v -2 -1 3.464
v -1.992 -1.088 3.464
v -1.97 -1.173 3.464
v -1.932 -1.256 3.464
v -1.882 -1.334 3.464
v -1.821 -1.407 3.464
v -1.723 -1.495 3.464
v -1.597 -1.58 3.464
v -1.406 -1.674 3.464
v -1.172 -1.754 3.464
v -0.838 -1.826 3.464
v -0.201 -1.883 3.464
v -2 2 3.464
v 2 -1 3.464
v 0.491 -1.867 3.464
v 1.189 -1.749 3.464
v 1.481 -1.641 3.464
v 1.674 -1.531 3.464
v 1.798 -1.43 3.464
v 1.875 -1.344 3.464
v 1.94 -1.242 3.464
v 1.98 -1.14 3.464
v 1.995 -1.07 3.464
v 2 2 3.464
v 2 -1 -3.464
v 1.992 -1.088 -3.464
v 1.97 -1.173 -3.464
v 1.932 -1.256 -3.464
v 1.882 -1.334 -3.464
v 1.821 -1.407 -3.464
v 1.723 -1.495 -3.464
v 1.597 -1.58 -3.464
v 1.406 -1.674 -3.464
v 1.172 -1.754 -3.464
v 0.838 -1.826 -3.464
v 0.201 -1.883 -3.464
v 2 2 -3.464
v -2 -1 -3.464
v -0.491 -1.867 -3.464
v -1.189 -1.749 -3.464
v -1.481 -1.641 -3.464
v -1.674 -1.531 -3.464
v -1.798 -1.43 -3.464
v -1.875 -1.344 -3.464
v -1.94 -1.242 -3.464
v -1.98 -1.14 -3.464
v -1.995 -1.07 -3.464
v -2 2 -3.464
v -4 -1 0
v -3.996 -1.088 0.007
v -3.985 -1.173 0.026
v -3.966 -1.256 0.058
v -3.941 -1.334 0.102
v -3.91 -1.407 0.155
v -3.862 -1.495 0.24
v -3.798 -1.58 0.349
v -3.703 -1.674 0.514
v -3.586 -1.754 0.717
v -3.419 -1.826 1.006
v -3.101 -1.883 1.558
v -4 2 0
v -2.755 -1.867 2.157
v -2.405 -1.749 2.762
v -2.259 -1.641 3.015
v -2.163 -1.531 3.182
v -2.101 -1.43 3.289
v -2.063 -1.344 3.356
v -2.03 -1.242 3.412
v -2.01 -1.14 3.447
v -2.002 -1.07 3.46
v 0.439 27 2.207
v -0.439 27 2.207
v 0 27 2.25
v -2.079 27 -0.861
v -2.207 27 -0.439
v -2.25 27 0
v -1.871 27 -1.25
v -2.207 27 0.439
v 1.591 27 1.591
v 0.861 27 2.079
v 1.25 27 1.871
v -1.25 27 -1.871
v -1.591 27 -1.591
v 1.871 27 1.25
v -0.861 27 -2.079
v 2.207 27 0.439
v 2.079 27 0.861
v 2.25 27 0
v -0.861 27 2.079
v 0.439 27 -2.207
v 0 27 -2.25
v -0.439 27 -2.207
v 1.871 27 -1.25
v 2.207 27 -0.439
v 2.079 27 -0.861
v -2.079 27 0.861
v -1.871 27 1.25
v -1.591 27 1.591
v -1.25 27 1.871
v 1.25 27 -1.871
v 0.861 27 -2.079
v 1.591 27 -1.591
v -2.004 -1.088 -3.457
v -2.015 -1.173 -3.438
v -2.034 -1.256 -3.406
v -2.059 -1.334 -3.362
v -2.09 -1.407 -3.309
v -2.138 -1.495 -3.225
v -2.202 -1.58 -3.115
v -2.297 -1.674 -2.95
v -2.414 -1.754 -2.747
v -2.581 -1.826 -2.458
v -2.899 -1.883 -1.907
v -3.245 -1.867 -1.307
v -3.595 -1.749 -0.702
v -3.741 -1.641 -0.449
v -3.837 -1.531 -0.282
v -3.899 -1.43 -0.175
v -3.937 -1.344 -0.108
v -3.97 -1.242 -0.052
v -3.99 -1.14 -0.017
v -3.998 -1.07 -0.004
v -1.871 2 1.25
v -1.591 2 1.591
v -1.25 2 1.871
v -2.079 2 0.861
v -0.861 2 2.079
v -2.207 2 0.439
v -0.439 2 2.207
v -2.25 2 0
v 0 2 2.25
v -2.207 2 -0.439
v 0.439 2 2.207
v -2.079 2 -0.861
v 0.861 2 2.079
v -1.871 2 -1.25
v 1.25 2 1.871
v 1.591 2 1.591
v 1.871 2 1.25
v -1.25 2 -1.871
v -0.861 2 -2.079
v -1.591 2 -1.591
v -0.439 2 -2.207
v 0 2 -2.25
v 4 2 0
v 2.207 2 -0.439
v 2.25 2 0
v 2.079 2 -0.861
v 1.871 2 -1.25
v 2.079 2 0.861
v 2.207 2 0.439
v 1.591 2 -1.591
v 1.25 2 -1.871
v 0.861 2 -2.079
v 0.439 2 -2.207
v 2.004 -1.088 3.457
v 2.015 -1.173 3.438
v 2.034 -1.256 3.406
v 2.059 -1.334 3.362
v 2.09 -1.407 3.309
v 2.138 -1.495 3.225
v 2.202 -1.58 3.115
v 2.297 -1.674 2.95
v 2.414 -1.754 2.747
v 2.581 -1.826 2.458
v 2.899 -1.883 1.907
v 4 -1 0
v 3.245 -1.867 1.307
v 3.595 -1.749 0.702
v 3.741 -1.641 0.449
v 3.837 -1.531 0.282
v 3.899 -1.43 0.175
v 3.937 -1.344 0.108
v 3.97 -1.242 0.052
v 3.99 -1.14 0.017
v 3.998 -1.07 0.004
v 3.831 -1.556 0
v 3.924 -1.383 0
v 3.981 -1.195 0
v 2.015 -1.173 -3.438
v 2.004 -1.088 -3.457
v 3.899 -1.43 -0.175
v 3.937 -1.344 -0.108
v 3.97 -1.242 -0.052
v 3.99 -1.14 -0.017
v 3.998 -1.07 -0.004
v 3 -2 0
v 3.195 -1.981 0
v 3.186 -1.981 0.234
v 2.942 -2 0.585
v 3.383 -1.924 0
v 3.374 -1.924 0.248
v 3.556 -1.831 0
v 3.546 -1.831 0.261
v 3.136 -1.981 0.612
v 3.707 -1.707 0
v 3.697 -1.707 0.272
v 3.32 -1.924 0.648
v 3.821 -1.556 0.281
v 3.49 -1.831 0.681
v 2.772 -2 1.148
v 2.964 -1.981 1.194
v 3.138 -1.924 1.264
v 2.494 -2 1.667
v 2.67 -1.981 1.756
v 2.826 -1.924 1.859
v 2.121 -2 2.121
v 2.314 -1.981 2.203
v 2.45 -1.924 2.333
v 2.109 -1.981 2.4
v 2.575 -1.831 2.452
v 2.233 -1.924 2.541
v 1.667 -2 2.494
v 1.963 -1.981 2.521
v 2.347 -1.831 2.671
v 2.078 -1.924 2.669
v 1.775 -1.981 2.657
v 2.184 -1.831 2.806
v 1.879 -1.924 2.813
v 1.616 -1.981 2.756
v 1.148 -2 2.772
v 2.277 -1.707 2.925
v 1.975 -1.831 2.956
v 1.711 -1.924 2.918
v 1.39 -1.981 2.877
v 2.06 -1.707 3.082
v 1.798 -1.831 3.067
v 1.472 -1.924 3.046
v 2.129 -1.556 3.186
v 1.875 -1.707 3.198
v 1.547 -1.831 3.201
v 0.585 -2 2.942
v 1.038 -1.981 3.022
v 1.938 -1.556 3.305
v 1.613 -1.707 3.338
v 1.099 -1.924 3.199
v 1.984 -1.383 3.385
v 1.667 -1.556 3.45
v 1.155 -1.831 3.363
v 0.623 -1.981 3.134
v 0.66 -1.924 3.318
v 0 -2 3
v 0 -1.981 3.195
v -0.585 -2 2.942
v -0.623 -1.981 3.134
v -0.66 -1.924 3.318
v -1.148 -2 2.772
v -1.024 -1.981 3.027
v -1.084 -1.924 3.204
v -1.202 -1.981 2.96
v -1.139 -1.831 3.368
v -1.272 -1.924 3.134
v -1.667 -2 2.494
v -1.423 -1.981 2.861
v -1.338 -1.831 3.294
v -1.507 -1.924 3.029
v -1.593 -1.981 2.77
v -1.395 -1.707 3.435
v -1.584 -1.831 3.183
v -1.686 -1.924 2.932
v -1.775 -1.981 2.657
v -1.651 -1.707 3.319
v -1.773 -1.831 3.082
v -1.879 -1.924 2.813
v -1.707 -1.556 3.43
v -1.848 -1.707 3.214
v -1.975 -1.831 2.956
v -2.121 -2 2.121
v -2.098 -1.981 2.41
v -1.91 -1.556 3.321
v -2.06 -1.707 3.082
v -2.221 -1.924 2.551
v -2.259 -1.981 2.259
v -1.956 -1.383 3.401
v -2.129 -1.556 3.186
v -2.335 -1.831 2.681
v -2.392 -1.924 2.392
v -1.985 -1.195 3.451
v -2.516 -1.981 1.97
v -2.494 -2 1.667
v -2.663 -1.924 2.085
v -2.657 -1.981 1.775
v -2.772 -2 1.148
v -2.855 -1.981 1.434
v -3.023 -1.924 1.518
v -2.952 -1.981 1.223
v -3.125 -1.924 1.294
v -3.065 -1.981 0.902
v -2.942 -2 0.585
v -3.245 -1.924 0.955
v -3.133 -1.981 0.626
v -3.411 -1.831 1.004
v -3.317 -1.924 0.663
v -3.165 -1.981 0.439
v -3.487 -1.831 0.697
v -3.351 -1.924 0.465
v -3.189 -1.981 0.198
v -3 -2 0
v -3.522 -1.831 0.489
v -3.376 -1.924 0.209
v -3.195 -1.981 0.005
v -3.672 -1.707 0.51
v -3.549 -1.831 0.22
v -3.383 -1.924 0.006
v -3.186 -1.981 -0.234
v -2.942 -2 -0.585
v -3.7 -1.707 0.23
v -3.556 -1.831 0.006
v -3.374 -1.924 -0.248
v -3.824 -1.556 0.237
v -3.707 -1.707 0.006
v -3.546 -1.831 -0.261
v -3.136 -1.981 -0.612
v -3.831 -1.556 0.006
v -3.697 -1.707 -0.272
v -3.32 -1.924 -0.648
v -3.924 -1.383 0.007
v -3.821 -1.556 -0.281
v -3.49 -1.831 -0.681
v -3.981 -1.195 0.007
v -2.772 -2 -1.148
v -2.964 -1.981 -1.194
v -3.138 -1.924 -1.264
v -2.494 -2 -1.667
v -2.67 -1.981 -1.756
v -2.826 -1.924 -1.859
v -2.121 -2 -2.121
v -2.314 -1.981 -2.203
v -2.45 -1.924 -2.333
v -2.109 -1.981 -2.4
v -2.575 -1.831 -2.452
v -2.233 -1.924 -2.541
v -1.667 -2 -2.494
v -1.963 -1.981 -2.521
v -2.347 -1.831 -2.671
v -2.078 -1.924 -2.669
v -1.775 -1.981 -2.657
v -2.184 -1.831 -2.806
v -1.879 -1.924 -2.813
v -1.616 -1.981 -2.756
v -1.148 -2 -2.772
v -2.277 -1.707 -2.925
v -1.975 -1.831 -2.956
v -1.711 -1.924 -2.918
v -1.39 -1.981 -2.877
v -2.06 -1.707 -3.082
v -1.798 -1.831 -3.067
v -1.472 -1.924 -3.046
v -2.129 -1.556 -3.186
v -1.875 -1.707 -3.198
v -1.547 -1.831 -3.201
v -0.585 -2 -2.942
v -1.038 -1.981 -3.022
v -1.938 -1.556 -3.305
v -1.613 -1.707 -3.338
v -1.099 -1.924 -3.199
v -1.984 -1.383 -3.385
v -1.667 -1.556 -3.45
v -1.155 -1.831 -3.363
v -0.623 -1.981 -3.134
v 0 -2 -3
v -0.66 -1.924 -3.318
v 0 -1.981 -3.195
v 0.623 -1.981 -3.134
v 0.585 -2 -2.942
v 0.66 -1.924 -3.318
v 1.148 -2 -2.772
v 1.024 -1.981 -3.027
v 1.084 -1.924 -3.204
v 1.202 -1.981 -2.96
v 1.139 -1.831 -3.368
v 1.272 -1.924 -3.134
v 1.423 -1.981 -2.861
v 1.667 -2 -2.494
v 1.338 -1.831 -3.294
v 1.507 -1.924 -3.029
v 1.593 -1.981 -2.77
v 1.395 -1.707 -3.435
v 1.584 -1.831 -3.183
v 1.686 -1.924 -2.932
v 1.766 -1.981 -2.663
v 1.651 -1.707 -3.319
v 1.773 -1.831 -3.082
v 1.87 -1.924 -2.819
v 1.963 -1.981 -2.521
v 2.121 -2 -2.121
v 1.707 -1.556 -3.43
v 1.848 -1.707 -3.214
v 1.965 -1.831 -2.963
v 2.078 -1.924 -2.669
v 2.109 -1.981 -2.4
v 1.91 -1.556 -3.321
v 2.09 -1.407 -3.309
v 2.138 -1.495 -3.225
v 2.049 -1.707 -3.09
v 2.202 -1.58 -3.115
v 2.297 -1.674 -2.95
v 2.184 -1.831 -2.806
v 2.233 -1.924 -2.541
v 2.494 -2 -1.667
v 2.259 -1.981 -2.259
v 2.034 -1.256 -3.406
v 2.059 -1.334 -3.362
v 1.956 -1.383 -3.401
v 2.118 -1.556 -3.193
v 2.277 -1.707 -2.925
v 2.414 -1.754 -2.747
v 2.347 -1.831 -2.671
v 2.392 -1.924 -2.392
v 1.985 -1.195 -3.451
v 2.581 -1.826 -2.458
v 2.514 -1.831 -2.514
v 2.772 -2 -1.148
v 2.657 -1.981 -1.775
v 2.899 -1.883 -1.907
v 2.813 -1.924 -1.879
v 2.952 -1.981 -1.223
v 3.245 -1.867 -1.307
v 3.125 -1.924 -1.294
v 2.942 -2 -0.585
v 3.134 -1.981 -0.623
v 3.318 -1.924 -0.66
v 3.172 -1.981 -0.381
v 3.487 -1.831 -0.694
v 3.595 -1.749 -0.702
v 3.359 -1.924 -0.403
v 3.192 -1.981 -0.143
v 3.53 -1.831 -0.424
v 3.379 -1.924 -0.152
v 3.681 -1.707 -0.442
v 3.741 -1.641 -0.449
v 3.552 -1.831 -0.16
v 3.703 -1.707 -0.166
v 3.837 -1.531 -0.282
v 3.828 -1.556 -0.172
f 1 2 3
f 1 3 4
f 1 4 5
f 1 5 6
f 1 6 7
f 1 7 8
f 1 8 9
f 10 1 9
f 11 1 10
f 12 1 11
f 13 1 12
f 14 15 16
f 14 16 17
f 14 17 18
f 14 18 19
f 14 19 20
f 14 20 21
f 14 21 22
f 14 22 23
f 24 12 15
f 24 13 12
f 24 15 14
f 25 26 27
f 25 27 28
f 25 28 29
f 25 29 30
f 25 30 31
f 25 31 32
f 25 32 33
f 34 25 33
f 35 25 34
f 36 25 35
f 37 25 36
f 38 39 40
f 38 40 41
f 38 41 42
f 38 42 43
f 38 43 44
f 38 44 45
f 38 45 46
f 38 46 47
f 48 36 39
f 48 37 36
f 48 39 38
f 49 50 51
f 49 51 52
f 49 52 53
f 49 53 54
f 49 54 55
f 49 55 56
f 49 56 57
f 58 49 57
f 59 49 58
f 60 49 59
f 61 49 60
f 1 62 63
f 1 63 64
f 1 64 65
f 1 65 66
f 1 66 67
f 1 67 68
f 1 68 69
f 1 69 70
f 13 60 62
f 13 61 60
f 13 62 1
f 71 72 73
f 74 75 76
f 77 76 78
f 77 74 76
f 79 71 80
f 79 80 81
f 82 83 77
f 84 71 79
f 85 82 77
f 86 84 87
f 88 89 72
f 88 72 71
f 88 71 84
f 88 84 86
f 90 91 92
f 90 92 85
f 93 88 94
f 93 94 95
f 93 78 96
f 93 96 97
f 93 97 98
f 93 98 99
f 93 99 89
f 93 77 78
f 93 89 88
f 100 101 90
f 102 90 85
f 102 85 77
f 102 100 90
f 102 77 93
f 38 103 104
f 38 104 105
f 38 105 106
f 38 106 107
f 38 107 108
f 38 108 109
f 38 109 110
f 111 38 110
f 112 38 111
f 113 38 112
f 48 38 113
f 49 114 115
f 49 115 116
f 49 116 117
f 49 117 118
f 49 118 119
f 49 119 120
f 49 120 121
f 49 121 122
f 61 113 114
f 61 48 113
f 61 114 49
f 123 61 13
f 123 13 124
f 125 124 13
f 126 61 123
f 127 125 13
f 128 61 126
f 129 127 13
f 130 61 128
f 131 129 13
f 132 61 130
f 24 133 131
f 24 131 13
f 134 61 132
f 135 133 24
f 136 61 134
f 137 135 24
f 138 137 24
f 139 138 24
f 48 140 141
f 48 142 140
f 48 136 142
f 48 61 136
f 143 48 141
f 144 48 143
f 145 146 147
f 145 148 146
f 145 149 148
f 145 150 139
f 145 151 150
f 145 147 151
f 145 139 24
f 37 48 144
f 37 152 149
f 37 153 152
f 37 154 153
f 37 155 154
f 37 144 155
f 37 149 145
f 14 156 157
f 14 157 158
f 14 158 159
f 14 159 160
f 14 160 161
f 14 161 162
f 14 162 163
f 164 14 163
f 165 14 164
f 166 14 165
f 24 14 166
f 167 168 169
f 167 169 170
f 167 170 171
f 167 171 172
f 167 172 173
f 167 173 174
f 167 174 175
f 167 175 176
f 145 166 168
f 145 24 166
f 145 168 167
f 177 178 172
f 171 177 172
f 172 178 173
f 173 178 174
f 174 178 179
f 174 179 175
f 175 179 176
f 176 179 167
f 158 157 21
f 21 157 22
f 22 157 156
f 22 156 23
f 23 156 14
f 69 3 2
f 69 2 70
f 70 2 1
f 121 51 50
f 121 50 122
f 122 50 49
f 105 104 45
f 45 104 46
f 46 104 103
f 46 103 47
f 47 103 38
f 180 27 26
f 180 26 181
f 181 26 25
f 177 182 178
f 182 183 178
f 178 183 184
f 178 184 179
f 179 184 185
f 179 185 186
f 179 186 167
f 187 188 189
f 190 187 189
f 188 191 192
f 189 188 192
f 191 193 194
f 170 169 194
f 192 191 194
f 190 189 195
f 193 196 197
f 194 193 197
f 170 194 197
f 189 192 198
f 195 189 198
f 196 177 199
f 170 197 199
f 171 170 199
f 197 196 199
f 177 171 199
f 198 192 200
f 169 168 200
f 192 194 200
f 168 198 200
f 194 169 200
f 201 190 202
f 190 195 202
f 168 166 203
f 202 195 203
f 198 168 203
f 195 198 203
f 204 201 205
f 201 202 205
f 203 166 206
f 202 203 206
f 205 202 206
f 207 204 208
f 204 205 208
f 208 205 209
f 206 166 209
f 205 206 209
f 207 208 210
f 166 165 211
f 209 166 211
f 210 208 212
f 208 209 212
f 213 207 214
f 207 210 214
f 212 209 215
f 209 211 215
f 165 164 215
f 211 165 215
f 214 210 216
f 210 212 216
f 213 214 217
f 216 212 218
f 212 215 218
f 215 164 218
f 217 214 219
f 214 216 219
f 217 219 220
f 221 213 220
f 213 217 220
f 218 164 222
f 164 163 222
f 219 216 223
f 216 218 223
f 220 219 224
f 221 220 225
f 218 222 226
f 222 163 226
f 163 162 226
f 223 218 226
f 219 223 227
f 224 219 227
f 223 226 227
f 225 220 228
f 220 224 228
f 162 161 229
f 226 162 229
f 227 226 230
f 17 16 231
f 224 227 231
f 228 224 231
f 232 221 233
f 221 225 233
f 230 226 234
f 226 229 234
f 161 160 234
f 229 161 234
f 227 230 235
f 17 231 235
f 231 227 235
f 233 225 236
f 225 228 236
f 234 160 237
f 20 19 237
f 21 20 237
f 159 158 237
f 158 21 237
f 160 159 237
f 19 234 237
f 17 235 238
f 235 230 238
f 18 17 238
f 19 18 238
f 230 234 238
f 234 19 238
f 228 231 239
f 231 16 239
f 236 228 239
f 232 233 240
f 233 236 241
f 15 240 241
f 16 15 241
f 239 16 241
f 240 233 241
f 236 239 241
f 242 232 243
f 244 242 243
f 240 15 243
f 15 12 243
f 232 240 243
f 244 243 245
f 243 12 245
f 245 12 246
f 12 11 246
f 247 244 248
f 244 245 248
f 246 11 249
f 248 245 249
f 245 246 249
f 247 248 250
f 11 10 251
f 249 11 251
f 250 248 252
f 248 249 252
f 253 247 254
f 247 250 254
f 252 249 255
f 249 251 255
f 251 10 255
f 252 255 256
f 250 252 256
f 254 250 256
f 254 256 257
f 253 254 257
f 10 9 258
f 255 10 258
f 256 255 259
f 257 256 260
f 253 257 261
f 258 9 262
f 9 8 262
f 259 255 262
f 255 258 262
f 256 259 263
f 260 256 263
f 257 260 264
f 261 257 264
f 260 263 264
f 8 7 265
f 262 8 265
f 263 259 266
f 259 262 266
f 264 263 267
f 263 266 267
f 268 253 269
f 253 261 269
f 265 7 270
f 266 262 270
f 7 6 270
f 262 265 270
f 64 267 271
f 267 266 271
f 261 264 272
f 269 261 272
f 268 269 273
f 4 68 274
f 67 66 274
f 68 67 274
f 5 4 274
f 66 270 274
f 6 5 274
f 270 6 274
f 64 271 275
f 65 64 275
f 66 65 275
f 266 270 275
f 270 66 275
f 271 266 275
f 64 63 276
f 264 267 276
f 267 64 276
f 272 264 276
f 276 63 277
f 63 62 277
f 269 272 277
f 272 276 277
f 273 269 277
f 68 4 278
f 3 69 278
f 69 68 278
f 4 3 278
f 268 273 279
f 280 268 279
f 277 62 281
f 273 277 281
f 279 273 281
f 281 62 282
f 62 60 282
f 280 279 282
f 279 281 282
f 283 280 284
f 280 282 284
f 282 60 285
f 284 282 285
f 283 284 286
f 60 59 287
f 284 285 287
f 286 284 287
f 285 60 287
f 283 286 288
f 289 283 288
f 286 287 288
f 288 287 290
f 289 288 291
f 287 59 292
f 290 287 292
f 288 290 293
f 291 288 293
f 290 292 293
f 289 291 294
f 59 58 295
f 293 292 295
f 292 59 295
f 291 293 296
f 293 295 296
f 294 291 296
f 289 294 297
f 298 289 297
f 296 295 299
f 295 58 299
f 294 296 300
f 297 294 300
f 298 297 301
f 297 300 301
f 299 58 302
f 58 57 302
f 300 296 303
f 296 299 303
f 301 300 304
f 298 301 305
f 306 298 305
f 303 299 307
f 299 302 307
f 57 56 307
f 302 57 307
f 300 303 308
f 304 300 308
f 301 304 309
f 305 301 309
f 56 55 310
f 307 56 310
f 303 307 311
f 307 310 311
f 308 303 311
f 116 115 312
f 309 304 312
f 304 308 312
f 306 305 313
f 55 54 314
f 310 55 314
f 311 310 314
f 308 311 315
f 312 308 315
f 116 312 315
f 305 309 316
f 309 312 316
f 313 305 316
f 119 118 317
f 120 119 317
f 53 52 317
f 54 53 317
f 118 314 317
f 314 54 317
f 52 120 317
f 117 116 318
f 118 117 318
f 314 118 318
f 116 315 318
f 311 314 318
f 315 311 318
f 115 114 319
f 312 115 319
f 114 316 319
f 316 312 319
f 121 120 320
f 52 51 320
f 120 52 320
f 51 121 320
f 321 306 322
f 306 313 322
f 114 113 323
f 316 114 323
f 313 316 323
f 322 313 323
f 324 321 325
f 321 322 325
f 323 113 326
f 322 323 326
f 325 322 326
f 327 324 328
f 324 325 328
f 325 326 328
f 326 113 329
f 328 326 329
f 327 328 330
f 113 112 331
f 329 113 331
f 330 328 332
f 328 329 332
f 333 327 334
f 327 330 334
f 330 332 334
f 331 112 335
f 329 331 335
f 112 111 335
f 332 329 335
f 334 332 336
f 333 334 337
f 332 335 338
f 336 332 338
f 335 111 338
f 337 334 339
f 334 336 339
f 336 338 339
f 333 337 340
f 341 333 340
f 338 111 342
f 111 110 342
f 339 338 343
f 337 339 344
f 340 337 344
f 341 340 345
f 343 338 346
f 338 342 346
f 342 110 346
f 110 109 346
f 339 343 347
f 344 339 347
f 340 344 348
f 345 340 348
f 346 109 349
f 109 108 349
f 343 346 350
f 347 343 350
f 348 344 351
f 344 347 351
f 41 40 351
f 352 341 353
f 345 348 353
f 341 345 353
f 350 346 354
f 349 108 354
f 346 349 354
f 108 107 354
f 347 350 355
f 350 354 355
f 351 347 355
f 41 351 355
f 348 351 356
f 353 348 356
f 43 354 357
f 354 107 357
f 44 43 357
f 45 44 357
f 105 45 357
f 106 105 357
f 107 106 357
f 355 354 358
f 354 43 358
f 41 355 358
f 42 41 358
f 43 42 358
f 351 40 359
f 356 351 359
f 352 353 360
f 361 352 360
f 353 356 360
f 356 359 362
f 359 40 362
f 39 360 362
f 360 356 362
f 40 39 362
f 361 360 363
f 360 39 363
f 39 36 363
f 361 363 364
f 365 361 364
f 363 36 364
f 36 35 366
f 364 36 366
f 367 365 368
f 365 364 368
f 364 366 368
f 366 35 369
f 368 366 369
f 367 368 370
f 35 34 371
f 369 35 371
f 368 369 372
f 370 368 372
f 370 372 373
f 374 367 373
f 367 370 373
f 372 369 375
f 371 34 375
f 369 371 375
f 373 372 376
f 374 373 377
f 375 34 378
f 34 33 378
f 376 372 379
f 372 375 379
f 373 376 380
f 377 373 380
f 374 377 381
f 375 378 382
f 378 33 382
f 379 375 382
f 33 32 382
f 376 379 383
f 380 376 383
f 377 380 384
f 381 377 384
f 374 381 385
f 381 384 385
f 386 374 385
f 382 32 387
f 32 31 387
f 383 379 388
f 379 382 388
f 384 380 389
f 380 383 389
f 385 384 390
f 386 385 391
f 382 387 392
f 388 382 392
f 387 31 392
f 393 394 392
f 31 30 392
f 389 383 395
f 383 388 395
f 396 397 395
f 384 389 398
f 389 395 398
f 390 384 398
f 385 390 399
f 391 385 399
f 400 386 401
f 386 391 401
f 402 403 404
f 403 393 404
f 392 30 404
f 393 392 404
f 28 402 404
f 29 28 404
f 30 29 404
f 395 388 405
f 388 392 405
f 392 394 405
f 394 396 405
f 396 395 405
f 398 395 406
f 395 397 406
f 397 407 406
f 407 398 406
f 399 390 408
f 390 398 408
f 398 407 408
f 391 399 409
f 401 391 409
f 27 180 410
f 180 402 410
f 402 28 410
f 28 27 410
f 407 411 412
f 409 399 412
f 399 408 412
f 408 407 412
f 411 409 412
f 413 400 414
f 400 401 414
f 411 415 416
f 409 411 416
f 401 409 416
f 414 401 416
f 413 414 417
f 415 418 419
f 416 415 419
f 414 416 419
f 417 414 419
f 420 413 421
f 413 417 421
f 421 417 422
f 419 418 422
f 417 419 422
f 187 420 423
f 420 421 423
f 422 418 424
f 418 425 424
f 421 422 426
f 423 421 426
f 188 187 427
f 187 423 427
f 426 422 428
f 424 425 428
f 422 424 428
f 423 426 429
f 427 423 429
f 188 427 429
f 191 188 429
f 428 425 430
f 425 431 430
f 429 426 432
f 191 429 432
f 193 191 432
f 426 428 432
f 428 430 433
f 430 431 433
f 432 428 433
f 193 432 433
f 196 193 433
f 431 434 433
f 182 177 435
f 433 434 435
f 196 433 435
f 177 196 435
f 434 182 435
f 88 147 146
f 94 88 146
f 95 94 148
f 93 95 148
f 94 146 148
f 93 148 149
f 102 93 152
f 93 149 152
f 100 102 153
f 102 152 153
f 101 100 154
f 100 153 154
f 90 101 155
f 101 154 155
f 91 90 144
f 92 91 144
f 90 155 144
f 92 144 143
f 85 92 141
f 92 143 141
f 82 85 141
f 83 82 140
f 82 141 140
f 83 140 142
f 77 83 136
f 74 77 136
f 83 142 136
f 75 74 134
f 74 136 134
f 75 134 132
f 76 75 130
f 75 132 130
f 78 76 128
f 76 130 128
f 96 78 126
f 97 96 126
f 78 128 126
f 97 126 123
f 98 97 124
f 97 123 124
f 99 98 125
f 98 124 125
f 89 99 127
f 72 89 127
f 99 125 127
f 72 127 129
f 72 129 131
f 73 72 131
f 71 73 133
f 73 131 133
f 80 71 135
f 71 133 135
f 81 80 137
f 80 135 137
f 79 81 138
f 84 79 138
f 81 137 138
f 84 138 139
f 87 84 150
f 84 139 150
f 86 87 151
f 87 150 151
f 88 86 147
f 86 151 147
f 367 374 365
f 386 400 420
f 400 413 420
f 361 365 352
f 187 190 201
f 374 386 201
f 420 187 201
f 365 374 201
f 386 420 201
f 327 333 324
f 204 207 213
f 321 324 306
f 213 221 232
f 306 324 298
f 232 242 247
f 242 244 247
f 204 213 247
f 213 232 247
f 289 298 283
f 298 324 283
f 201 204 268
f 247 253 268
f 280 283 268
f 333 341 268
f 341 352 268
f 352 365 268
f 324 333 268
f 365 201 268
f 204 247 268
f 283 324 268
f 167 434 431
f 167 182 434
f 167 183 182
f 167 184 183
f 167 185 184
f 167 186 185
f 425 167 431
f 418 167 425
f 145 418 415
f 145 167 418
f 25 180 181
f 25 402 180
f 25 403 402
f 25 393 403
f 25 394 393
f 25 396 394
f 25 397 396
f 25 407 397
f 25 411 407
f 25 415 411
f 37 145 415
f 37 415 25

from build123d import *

# Parameters (mm, degrees)
BOSS_EXTRUDE1_DEPTH = 2
SKETCH2_R           = 2.25
BOSS_EXTRUDE2_DEPTH = 25


with BuildPart() as part:
    # Sketch1 → Boss-Extrude1 (new body, symmetric)
    with BuildSketch(Plane(origin=(0, 0, 0), x_dir=(1, 0, 0), z_dir=(0, 1, 0))):
        Polygon((4, 0), (2, 3.464101615), (-2, 3.464101615), (-4, 0), (-2, -3.464101615), (2, -3.464101615), align=None)
    extrude(amount=BOSS_EXTRUDE1_DEPTH, both=True)

    # Sketch2 → Boss-Extrude2 (add)
    with BuildSketch(Plane(origin=(0, 2, 0), x_dir=(1, 0, 0), z_dir=(0, 1, 0))):
        Circle(SKETCH2_R)
    extrude(amount=BOSS_EXTRUDE2_DEPTH)

    # Sketch3 → Cut-Revolve1 (revolve, cut)
    with BuildSketch(Plane.XY):
        with BuildLine():
            Line((2.248897347, -2), (3, -2))
            ThreePointArc((3, -2), (3.707106781, -1.707106781), (4, -1))
            Line((4, -1), (4, -0.81272303))
            Line((4, -0.81272303), (5.594351863, -2.268615273))
            Line((5.594351863, -2.268615273), (3.350773239, -3.273136669))
            Line((3.350773239, -3.273136669), (2.248897347, -2))
        make_face()
    revolve(axis=Axis((0, -2, 0), (0, -1, 0)), mode=Mode.SUBTRACT)


solid = part.part
